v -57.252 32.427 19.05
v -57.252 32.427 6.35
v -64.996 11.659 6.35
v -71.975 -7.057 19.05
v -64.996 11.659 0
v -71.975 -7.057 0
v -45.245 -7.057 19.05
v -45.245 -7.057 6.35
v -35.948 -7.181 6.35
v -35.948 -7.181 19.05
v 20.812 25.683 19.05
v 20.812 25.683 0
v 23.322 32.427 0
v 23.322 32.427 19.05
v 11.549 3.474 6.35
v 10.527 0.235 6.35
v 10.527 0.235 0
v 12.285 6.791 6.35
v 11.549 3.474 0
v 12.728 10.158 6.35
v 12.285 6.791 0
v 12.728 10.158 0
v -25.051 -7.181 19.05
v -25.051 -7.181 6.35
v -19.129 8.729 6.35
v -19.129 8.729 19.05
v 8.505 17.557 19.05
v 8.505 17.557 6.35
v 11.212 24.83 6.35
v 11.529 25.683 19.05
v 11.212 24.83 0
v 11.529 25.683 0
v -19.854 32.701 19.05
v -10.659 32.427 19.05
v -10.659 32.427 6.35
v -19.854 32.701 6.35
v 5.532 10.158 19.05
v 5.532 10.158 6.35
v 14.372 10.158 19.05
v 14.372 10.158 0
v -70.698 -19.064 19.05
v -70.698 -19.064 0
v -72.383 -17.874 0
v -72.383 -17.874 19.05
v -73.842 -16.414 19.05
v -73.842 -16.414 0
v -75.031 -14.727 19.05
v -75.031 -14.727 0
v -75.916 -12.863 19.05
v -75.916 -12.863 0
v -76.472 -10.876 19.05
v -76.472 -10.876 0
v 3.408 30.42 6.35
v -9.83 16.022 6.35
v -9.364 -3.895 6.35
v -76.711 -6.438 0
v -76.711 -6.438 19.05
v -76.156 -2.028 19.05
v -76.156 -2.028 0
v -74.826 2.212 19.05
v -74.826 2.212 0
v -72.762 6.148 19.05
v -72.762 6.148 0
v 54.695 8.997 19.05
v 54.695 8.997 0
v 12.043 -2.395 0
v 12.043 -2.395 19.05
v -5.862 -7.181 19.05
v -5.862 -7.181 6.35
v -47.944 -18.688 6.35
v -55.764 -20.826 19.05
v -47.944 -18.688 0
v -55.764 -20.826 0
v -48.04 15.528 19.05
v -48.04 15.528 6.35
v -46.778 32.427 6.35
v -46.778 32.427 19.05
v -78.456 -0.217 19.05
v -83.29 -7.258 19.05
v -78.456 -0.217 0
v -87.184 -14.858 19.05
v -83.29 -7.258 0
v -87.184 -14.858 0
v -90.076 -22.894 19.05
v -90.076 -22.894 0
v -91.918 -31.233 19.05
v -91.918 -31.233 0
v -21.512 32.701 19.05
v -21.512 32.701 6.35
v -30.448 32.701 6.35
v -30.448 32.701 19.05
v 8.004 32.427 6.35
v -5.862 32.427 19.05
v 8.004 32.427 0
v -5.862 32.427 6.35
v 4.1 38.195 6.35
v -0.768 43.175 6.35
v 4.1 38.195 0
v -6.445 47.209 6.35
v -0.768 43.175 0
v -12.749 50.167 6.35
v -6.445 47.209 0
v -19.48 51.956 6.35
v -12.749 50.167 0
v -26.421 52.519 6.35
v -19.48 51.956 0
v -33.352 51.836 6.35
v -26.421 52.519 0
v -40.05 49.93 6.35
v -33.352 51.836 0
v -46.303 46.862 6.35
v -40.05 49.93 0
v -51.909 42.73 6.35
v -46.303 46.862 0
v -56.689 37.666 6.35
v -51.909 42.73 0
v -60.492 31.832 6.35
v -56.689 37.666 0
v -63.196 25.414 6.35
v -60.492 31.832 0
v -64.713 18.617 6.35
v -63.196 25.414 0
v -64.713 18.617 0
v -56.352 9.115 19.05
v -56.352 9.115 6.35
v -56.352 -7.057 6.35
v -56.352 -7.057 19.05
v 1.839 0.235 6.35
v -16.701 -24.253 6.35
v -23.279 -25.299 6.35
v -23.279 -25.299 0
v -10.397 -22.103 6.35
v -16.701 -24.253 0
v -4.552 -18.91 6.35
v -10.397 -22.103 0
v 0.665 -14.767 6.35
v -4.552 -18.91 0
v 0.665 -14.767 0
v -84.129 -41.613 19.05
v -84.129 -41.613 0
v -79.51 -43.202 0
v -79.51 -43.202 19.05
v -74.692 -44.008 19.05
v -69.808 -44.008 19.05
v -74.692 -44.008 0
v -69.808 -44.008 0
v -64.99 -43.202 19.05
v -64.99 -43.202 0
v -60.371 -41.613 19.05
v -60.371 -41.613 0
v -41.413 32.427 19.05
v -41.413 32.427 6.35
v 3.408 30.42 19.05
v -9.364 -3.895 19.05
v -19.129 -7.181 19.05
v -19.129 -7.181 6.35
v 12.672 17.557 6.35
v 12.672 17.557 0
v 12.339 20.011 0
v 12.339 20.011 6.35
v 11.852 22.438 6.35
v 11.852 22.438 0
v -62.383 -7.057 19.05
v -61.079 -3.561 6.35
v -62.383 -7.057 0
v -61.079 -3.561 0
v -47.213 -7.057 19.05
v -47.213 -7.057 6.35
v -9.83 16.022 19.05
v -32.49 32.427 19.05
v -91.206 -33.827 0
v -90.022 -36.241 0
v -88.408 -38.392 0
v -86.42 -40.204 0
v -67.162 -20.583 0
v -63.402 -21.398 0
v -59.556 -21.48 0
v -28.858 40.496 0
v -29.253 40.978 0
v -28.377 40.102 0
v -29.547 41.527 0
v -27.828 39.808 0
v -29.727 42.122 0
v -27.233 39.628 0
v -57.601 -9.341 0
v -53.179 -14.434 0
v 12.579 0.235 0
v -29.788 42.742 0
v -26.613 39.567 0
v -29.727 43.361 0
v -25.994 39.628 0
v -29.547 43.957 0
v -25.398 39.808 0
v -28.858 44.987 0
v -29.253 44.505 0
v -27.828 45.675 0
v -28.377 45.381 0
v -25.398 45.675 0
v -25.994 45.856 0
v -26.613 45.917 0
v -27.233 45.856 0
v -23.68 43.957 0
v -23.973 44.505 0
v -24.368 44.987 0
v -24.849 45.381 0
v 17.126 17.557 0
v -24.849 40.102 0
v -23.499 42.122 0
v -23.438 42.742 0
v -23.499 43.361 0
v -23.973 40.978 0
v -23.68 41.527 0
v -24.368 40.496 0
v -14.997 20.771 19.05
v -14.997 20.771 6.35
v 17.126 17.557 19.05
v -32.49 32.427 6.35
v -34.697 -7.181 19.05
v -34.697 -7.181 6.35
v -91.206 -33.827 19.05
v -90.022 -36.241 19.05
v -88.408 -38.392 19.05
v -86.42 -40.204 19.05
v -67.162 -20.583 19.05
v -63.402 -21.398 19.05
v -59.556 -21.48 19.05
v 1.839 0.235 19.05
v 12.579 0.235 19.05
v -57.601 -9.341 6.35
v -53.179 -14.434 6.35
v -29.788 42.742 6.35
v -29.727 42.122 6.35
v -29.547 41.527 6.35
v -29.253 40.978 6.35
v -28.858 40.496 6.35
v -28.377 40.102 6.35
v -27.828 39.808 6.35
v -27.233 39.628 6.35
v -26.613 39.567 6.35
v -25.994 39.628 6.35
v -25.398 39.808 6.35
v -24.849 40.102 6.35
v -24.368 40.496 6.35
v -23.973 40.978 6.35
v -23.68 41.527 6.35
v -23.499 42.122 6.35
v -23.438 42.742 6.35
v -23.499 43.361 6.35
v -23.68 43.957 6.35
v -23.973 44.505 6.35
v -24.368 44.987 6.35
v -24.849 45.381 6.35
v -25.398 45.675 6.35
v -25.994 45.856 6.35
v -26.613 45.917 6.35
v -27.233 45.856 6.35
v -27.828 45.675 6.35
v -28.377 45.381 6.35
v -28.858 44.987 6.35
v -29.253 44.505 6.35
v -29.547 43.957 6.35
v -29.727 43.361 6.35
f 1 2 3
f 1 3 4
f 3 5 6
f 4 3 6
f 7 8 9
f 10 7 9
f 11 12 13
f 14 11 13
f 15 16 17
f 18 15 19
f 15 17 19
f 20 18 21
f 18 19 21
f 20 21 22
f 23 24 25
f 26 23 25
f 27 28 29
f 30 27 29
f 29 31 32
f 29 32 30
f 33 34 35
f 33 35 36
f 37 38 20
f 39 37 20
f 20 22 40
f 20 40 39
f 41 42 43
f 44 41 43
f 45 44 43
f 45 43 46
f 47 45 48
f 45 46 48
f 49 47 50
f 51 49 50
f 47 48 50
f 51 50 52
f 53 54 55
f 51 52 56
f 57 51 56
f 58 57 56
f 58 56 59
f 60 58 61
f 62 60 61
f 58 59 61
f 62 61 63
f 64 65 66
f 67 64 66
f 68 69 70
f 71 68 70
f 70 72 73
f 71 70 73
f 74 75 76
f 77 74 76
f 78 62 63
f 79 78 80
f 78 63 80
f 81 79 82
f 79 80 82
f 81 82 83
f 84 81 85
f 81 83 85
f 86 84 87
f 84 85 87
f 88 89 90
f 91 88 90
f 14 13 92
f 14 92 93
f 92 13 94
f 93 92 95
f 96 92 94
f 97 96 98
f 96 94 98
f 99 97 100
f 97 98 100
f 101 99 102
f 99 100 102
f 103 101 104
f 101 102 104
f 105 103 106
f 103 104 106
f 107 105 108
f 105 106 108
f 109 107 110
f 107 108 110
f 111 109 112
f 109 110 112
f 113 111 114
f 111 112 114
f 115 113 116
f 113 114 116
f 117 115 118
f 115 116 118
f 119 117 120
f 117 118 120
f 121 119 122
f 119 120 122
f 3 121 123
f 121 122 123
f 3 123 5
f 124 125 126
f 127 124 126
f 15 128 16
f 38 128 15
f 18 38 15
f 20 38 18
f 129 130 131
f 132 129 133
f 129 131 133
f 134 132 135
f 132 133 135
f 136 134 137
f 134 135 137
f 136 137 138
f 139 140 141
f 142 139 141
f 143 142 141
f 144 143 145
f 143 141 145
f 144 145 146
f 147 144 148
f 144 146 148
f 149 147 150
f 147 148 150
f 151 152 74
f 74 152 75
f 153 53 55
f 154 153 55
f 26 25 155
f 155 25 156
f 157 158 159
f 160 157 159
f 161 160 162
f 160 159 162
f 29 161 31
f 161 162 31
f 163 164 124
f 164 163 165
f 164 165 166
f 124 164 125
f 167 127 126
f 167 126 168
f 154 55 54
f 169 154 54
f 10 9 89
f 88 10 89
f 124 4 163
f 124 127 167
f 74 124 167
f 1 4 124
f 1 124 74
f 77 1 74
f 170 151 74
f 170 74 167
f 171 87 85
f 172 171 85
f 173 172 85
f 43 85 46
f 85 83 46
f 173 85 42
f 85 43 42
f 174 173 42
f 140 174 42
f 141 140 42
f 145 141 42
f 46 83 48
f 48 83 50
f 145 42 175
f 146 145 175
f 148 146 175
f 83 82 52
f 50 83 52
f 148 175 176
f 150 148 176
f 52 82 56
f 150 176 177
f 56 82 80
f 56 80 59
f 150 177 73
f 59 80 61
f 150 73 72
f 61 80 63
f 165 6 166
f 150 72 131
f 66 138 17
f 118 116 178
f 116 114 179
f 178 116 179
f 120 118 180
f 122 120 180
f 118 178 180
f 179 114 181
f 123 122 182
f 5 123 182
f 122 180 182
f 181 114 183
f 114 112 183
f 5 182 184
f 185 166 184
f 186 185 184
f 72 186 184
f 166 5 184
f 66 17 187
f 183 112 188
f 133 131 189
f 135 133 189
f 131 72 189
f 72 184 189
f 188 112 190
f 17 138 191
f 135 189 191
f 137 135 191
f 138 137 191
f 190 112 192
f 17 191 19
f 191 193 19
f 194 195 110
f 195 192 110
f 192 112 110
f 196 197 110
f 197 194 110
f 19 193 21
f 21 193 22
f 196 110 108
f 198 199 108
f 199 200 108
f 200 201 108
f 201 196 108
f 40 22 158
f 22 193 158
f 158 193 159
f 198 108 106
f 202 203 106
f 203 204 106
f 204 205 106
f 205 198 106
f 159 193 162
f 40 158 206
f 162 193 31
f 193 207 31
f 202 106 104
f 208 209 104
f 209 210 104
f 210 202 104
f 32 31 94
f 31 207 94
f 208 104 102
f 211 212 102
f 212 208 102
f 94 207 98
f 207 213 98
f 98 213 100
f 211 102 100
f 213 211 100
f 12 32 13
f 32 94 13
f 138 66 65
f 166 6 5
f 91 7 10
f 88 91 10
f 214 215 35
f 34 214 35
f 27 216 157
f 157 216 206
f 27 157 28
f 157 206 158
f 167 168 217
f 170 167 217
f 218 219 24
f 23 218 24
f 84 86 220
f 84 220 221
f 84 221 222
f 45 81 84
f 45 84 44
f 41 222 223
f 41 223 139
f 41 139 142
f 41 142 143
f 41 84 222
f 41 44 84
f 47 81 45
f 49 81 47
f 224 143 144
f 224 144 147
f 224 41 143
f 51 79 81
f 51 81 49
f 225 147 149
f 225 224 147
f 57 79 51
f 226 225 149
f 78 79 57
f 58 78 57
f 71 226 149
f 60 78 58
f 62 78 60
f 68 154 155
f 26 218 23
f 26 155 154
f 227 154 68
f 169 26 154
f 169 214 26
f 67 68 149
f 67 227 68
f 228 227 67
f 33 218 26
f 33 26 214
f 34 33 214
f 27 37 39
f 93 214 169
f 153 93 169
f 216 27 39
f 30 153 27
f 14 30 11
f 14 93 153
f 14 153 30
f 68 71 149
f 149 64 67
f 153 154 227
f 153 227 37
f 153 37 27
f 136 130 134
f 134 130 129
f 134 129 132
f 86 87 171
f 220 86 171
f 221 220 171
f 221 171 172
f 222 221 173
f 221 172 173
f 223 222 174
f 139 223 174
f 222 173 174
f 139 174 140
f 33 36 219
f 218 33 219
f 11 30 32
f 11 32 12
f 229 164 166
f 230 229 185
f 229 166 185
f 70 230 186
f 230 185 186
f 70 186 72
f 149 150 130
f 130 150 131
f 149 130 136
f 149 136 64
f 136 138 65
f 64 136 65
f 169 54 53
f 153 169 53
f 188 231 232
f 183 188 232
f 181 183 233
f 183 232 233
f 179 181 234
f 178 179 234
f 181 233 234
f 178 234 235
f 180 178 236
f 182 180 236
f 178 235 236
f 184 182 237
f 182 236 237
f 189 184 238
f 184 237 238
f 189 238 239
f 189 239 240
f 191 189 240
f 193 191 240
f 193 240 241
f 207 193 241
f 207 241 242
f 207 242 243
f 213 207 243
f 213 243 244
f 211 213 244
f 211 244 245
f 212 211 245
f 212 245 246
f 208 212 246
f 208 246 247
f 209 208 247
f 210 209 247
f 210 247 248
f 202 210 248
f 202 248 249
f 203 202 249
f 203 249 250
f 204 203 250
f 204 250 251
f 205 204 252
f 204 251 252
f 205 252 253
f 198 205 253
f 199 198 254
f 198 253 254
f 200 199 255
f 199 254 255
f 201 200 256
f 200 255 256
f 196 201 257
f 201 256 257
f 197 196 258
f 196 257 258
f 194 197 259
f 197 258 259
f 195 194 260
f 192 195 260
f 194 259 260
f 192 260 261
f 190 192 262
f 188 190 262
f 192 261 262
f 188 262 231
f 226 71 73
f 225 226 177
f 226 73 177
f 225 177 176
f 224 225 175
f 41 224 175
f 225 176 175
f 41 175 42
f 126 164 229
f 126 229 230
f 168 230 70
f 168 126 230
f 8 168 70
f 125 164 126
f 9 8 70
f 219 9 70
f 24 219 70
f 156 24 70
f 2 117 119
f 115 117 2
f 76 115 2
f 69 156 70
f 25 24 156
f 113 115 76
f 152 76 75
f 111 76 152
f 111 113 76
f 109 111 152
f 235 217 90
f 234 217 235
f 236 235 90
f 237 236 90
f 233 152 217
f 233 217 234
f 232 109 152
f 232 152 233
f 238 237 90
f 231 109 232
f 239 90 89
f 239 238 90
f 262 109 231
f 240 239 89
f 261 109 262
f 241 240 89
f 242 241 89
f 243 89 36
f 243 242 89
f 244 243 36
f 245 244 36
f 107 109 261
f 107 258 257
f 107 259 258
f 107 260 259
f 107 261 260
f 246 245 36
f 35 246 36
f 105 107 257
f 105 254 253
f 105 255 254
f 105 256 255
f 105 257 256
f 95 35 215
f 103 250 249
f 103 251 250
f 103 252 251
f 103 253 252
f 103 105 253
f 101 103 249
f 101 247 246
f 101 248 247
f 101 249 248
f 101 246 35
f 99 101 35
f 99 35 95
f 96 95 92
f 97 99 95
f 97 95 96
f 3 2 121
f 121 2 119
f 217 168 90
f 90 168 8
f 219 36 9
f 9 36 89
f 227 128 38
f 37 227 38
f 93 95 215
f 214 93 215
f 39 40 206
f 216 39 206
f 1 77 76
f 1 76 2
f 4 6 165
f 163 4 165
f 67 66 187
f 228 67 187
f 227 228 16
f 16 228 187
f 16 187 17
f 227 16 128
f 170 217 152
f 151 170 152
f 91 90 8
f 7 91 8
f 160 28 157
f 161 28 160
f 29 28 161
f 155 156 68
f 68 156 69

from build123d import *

# Parameters (mm, degrees)
F2_DEPTH = 19.05
F1_R     = 38.9599032657
F3_DEPTH = 6.35
F4_D     = 6.35


with BuildPart() as f2:
    # F0 (on Top) → F2 (new body)
    with BuildSketch(Plane.XY):
        Polygon((-46.7784367502, 32.4274450541), (-57.2518631816, 32.4274450541), (-71.9749704003, -7.0572411641), (-62.3826421797, -7.0572411641), (-56.3522954025, 9.1150482002), (-56.3522954025, -7.0572411641), (-47.213383019, -7.0572411641), (-32.4902758002, 32.4274450541), (-41.4133742452, 32.4274450541), (-48.040356487, 15.5276963487), align=None)
    extrude(amount=F2_DEPTH)



with BuildPart() as f2b:
    # F0 (on Top) → F2, piece 2 (new body)
    with BuildSketch(Plane.XY):
        Polygon((-35.947676748, -7.1813631803), (-21.5117447078, 32.7009521425), (-30.4481759667, 32.7009521425), (-45.2453941107, -7.0572411641), align=None)
    extrude(amount=F2_DEPTH)


with BuildPart() as f2c:
    # F0 (on Top) → F2, piece 3 (new body)
    with BuildSketch(Plane.XY):
        with BuildLine():
            Line((-14.9974728457, 20.7705546892), (-10.6590073556, 32.4274450541))
            Line((-10.6590073556, 32.4274450541), (-19.8539756238, 32.7009521425))
            Line((-19.8539756238, 32.7009521425), (-34.6973895427, -7.1813631803))
            Line((-34.6973895427, -7.1813631803), (-25.0511299819, -7.1813631803))
            Line((-25.0511299819, -7.1813631803), (-19.1294675285, 8.7293707311))
            Line((-19.1294675285, 8.7293707311), (-19.1294675285, -7.1813631803))
            Line((-19.1294675285, -7.1813631803), (-5.8616320603, -7.1813631803))
            Line((-5.8616320603, -7.1813631803), (-55.7639412582, -20.8262596279))
            ThreePointArc((-55.7639412582, -20.8262596279), (-63.4022025331, -21.3981451994), (-70.6976205111, -19.0642718226))
            ThreePointArc((-70.6976205111, -19.0642718226), (-74.472426735, -15.5960277609), (-76.4715448022, -10.8757093549))
            ThreePointArc((-76.4715448022, -10.8757093549), (-76.1562173184, -2.0282490142), (-72.7623030543, 6.14844542))
            ThreePointArc((-72.7623030543, 6.14844542), (-85.358680949, -10.9955429484), (-91.9176340103, -31.233260408))
            ThreePointArc((-91.9176340103, -31.233260408), (-89.2652472877, -37.3547894918), (-84.1291844845, -41.6126213968))
            ThreePointArc((-84.1291844845, -41.6126213968), (-72.2500160336, -44.1096014144), (-60.3708475828, -41.6126213968))
            Line((-60.3708475828, -41.6126213968), (54.6953529119, 8.9968936518))
            Line((54.6953529119, 8.9968936518), (12.0426900685, -2.3953781929))
            Line((12.0426900685, -2.3953781929), (12.5787025318, 0.2347060363))
            Line((12.5787025318, 0.2347060363), (1.8387236853, 0.2347060363))
            Line((1.8387236853, 0.2347060363), (5.5321310647, 10.158409473))
            Line((5.5321310647, 10.158409473), (14.3720662783, 10.158409473))
            Line((14.3720662783, 10.158409473), (17.1257853508, 17.5572931099))
            Line((17.1257853508, 17.5572931099), (8.5047732013, 17.5572931099))
            Line((8.5047732013, 17.5572931099), (11.5288449451, 25.6825790789))
            Line((11.5288449451, 25.6825790789), (20.8120857023, 25.6825790789))
            Line((20.8120857023, 25.6825790789), (23.3223922551, 32.4274450541))
            Line((23.3223922551, 32.4274450541), (-5.8616320603, 32.4274450541))
            Line((-5.8616320603, 32.4274450541), (-14.9974728457, 20.7705546892))
        make_face()
        Polygon((3.4076007732, 30.4201329794), (-9.3637462705, -3.8948091678), (-9.8301135004, 16.0215999931), align=None, mode=Mode.SUBTRACT)
    extrude(amount=F2_DEPTH)


with BuildPart() as f2_1:
    add(f2.part)

    add(f2b.part)  # F3 merges F2b

    add(f2c.part)  # F3 merges F2c
    # F1 (on Top) → F3 (join)
    with BuildSketch(Plane.XY):
        with Locations((-26.0827448219, 13.5601842776)):
            Circle(F1_R)
    extrude(amount=F3_DEPTH)

    # F4 (through all)
    with Locations(Plane(origin=(0, 0, 0), x_dir=(1, 0, 0), z_dir=(0, 0, -1))):
        with Locations((-26.6133137047, -42.7415519953)):
            Hole(F4_D / 2)


solid = f2_1.part
